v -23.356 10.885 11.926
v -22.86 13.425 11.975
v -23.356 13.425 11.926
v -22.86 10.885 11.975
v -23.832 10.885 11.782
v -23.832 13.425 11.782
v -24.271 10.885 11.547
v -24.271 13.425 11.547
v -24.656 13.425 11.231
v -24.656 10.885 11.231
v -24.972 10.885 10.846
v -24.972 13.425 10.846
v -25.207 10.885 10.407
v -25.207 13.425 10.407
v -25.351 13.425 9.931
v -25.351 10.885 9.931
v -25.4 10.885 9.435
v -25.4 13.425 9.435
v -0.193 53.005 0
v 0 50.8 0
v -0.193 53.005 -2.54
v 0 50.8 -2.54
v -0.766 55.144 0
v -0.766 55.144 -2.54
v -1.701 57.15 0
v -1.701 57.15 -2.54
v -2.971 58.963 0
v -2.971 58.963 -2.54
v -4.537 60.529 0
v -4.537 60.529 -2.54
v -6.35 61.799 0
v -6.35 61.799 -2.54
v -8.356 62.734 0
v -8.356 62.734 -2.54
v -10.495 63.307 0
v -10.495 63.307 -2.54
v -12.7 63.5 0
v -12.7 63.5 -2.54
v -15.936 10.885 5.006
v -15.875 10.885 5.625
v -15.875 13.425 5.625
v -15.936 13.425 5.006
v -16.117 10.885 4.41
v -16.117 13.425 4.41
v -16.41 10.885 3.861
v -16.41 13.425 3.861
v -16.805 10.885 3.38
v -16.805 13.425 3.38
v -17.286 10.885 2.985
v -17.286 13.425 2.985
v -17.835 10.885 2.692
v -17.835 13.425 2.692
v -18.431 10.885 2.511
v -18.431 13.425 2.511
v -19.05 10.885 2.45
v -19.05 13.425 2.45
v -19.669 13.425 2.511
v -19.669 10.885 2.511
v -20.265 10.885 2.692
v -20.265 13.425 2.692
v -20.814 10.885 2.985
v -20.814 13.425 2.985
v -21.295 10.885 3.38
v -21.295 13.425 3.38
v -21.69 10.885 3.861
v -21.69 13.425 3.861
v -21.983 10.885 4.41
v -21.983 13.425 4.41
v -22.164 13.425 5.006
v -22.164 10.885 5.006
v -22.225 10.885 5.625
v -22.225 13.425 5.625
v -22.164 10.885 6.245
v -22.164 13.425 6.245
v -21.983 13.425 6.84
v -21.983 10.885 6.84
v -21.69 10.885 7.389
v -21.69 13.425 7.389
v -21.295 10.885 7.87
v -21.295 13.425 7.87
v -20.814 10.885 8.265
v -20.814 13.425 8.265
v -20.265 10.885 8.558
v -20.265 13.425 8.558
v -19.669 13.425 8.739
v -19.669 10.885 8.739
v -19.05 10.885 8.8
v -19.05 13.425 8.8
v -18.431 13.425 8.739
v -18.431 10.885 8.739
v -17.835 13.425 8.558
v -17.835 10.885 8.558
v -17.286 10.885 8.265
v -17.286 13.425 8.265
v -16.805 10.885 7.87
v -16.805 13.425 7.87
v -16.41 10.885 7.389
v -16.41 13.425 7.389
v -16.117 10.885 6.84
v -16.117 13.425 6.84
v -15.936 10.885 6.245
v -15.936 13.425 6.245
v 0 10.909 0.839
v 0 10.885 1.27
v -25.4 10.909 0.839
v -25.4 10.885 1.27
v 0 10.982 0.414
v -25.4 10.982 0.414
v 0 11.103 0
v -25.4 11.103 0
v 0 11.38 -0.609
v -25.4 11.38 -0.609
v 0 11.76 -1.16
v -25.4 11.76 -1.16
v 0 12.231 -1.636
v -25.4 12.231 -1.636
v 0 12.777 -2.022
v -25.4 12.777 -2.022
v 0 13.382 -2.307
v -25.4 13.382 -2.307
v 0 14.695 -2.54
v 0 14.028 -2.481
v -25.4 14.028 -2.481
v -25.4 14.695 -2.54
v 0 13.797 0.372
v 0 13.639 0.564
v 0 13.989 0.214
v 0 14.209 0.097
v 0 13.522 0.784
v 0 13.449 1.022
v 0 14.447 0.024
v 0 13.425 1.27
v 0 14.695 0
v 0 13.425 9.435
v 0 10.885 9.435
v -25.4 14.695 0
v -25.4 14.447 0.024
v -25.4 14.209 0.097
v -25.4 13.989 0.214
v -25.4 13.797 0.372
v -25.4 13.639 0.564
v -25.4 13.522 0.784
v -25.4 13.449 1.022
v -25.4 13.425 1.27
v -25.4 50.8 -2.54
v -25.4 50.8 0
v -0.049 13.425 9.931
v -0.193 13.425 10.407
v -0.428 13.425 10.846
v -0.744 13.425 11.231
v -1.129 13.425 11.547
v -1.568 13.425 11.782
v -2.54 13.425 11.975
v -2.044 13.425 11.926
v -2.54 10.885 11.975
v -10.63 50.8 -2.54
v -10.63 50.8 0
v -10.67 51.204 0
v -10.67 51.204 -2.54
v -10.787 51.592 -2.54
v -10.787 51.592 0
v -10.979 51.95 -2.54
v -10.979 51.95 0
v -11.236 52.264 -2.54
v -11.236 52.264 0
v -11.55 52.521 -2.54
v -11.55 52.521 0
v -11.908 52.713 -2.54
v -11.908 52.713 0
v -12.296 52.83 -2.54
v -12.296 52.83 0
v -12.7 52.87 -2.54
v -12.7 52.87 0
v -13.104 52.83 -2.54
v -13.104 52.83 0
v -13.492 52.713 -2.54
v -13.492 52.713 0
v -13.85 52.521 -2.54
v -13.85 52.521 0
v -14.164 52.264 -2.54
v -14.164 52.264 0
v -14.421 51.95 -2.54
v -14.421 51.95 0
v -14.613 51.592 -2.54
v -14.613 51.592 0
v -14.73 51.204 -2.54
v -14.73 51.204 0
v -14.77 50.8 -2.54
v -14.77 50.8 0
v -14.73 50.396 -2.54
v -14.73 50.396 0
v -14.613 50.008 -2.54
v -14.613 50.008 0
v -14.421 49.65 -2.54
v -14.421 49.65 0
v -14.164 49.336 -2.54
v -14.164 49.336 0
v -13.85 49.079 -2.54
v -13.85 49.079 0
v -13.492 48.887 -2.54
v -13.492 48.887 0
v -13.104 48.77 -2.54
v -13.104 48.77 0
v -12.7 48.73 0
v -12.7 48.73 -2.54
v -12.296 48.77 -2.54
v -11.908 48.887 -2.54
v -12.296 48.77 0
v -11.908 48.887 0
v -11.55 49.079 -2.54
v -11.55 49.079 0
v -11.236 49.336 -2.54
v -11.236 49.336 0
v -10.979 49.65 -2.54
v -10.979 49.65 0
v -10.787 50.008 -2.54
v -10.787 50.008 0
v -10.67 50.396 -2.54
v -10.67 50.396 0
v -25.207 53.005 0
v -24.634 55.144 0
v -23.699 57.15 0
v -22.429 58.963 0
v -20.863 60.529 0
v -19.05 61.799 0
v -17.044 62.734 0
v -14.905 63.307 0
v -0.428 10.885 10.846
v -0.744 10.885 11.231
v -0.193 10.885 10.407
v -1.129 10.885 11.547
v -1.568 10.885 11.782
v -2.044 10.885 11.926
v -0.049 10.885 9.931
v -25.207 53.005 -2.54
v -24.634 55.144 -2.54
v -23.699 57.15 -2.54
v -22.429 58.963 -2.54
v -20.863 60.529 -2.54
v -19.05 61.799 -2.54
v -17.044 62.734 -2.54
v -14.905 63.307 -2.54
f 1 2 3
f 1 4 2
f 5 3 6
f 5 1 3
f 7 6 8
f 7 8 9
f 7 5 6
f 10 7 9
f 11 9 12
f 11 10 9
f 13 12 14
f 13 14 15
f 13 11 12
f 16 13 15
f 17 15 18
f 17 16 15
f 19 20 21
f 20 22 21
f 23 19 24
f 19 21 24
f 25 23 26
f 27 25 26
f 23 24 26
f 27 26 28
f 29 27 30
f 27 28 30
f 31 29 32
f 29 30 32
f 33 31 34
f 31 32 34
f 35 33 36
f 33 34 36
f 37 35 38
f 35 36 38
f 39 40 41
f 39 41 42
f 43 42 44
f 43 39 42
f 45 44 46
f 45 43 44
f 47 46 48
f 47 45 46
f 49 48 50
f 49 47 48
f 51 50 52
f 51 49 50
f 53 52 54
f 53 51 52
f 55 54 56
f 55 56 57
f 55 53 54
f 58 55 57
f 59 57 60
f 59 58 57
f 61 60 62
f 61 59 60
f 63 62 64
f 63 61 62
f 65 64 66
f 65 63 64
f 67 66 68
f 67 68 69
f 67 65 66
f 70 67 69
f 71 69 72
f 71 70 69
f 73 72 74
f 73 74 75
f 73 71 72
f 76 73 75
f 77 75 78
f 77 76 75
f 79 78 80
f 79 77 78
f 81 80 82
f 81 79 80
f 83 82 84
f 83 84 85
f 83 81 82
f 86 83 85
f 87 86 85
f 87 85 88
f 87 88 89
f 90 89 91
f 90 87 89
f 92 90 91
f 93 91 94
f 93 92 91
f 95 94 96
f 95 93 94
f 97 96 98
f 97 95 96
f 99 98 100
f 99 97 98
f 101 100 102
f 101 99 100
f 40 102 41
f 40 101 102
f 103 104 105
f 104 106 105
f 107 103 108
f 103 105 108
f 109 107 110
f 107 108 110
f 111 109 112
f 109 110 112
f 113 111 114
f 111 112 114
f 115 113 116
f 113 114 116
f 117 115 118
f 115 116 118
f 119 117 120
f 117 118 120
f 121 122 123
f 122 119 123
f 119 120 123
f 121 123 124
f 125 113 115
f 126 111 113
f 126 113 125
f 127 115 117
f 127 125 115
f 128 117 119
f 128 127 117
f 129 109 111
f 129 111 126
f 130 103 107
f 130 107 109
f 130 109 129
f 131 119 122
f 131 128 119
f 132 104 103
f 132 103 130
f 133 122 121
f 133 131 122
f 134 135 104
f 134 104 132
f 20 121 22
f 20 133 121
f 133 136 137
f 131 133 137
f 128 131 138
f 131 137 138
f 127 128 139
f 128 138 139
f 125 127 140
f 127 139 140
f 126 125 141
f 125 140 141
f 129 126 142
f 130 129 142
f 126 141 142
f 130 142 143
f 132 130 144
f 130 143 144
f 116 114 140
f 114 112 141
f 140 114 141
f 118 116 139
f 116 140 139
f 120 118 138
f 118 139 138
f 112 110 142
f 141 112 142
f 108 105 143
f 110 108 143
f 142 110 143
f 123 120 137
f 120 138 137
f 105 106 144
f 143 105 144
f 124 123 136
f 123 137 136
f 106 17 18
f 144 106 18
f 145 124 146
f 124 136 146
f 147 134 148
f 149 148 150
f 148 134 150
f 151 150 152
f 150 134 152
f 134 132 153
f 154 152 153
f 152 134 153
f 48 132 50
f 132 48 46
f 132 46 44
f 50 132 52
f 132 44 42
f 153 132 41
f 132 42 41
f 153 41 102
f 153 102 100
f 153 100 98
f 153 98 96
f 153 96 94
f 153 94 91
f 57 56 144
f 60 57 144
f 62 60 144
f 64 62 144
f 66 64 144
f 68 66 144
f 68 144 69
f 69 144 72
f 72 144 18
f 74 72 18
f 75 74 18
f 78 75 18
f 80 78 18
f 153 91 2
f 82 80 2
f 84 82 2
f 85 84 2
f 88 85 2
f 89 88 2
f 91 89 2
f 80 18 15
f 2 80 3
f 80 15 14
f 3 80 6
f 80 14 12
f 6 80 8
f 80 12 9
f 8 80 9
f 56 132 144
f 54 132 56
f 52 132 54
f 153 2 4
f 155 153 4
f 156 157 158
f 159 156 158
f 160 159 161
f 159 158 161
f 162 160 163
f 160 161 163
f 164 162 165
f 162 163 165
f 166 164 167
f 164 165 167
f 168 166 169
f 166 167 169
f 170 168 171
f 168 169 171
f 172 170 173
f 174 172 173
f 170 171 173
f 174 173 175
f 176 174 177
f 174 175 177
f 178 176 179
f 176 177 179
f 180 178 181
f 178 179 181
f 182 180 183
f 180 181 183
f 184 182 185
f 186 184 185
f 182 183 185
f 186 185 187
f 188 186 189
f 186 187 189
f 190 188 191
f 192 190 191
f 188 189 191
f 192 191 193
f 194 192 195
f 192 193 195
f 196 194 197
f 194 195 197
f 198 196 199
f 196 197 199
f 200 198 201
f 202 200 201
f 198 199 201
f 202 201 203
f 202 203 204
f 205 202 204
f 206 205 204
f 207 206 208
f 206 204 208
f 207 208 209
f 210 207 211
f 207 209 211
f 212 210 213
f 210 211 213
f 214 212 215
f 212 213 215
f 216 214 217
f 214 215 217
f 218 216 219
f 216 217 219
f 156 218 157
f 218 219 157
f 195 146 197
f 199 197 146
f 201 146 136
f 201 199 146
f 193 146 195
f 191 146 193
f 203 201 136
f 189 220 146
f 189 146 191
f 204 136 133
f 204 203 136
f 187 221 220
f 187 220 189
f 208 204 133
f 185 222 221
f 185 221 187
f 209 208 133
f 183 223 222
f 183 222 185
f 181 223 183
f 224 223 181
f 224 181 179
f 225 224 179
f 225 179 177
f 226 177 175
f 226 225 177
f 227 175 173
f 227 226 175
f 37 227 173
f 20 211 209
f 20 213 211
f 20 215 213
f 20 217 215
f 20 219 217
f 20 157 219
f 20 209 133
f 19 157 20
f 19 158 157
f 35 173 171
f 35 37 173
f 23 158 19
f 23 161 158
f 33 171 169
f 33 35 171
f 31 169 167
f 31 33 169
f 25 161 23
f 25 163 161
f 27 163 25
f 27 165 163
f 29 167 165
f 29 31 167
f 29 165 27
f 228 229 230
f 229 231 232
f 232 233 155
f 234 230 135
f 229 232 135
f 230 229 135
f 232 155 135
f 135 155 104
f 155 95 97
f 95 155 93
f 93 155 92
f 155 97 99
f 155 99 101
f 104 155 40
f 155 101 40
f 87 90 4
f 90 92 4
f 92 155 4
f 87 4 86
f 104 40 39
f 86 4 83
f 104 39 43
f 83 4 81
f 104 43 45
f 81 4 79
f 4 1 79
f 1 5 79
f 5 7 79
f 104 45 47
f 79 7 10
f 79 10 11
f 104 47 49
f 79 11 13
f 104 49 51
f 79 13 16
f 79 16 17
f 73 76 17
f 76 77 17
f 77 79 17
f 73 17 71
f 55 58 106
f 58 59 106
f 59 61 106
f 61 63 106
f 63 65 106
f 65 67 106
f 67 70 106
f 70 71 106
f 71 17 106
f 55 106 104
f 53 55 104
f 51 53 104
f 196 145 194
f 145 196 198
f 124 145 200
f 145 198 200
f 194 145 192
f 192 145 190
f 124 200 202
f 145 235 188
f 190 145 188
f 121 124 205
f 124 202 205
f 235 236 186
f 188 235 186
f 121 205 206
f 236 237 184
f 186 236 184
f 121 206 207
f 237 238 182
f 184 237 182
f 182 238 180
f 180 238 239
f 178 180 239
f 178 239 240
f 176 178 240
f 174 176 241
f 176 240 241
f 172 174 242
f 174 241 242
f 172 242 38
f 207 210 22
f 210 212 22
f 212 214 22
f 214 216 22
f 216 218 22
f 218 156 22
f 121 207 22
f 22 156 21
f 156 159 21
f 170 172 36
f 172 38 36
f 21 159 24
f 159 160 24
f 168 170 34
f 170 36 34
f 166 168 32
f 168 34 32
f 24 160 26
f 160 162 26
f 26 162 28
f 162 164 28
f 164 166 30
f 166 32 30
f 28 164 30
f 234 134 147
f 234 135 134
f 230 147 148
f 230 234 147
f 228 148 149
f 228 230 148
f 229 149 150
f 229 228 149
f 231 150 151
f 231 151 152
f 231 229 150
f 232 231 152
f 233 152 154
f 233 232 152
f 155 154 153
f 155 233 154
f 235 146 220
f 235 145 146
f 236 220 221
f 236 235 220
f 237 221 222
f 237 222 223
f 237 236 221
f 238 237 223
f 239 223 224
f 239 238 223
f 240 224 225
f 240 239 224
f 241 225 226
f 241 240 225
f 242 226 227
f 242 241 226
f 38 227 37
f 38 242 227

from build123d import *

# Parameters (mm, degrees)
SKETCH1_W                  = 25.4
SKETCH1_H                  = 63.5
SKETCH1_R                  = 2.0701
SKETCH1_R_2                = 3.175
BASE_FLANGE1_DEPTH         = 2.54
SKETCHED_START             = -25.4
SKETCHED_BEND1_DEPTH       = 25.4
SKETCHED_START_2           = -15.8749999
SKETCHED_BEND1_2_DEPTH     = 15.8749999
SKETCHED_BEND1_3_DEPTH     = 3.1749999
SKETCHED_START_3           = -22.2250001
SKETCHED_BEND1_4_DEPTH     = 6.3500002
SKETCHED_START_4           = 10.884911335
SKETCHED_BEND1_5_OUTLINE_R = 3.175
SKETCHED_BEND1_5_DEPTH     = 2.54
FILLET1_R                  = 12.7
FILLET2_R                  = 2.54


with BuildPart() as part:
    # Base-Flange1: sheet metal written as solids
    # Sketch1 → Base-Flange1 (new body)
    with BuildSketch(Plane.XY):
        with Locations((-12.7, 31.75)):
            Rectangle(SKETCH1_W, SKETCH1_H)
        with Locations((-12.7, 50.8)):
            Circle(SKETCH1_R, mode=Mode.SUBTRACT)
        with Locations((-19.05, 6.35)):
            Circle(SKETCH1_R_2, mode=Mode.SUBTRACT)
    extrude(amount=-BASE_FLANGE1_DEPTH)

    # Sketched Bend1: read off the stored shape, not the designer's step
    # Sketched Bend1 outline → Sketched Bend1 (cut)
    with BuildSketch(Plane.YZ.offset(SKETCHED_START)):
        with BuildLine():
            ThreePointArc((14.694911335, -2.54), (12.49520681, -1.840851973), (11.102808887, 0))
            Line((11.102808887, 0), (0, 0))
            Line((0, 0), (0, -2.54))
            Line((0, -2.54), (14.694911335, -2.54))
        make_face()
    extrude(amount=SKETCHED_BEND1_DEPTH, mode=Mode.SUBTRACT)

    # Sketched Bend1 2 outline → Sketched Bend1 2 (add)
    with BuildSketch(Plane.YZ.offset(SKETCHED_START_2)):
        with BuildLine():
            Line((10.884911335, 11.975088665), (10.884911335, 1.27))
            ThreePointArc((10.884911335, 1.27), (10.939780823, 0.625721461), (11.102808887, 0))
            Line((11.102808887, 0), (14.694911335, 0))
            ThreePointArc((14.694911335, 0), (13.796885723, 0.371974388), (13.424911335, 1.27))
            Line((13.424911335, 1.27), (13.424911335, 11.975088665))
            Line((13.424911335, 11.975088665), (10.884911335, 11.975088665))
        make_face()
    extrude(amount=SKETCHED_BEND1_2_DEPTH)

    # Sketched Bend1 3 outline → Sketched Bend1 3 (add)
    with BuildSketch(Plane.YZ.offset(SKETCHED_START)):
        with BuildLine():
            Line((10.884911335, 11.975088665), (10.884911335, 1.27))
            ThreePointArc((10.884911335, 1.27), (10.939780823, 0.625721461), (11.102808887, 0))
            Line((11.102808887, 0), (14.694911335, 0))
            ThreePointArc((14.694911335, 0), (13.796885723, 0.371974388), (13.424911335, 1.27))
            Line((13.424911335, 1.27), (13.424911335, 11.975088665))
            Line((13.424911335, 11.975088665), (10.884911335, 11.975088665))
        make_face()
    extrude(amount=SKETCHED_BEND1_3_DEPTH)

    # Sketched Bend1 4 outline → Sketched Bend1 4 (add)
    with BuildSketch(Plane.YZ.offset(SKETCHED_START_3)):
        with BuildLine():
            Line((10.884911335, 11.975088665), (10.884911335, 1.27))
            ThreePointArc((10.884911335, 1.27), (10.939780823, 0.625721461), (11.102808887, 0))
            Line((11.102808887, 0), (14.694911335, 0))
            ThreePointArc((14.694911335, 0), (13.796885723, 0.371974388), (13.424911335, 1.27))
            Line((13.424911335, 1.27), (13.424911335, 11.975088665))
            Line((13.424911335, 11.975088665), (10.884911335, 11.975088665))
        make_face()
    extrude(amount=SKETCHED_BEND1_4_DEPTH)

    # Sketched Bend1 5 outline → Sketched Bend1 5 (cut)
    with BuildSketch(Plane(origin=(0, 0, 0), x_dir=(1, 0, 0), z_dir=(0, 1, 0)).offset(SKETCHED_START_4)):
        with Locations((-19.05, -5.625088665)):
            Circle(SKETCHED_BEND1_5_OUTLINE_R)
    extrude(amount=SKETCHED_BEND1_5_DEPTH, mode=Mode.SUBTRACT)

    # Fillet1
    fillet1_edges = [part.edges().sort_by_distance(p)[0] for p in [
        (-25.4, 63.5, -1.27),
        (0, 63.5, -1.27),
    ]]
    fillet(fillet1_edges, radius=FILLET1_R - 0.0001)  # a hair under: the kernel refuses the full size

    # Fillet2
    fillet2_edges = [part.edges().sort_by_distance(p)[0] for p in [
        (0, 12.154911335, 11.975088665),
        (-25.4, 12.154911335, 11.975088665),
    ]]
    fillet(fillet2_edges, radius=FILLET2_R)


solid = part.part
